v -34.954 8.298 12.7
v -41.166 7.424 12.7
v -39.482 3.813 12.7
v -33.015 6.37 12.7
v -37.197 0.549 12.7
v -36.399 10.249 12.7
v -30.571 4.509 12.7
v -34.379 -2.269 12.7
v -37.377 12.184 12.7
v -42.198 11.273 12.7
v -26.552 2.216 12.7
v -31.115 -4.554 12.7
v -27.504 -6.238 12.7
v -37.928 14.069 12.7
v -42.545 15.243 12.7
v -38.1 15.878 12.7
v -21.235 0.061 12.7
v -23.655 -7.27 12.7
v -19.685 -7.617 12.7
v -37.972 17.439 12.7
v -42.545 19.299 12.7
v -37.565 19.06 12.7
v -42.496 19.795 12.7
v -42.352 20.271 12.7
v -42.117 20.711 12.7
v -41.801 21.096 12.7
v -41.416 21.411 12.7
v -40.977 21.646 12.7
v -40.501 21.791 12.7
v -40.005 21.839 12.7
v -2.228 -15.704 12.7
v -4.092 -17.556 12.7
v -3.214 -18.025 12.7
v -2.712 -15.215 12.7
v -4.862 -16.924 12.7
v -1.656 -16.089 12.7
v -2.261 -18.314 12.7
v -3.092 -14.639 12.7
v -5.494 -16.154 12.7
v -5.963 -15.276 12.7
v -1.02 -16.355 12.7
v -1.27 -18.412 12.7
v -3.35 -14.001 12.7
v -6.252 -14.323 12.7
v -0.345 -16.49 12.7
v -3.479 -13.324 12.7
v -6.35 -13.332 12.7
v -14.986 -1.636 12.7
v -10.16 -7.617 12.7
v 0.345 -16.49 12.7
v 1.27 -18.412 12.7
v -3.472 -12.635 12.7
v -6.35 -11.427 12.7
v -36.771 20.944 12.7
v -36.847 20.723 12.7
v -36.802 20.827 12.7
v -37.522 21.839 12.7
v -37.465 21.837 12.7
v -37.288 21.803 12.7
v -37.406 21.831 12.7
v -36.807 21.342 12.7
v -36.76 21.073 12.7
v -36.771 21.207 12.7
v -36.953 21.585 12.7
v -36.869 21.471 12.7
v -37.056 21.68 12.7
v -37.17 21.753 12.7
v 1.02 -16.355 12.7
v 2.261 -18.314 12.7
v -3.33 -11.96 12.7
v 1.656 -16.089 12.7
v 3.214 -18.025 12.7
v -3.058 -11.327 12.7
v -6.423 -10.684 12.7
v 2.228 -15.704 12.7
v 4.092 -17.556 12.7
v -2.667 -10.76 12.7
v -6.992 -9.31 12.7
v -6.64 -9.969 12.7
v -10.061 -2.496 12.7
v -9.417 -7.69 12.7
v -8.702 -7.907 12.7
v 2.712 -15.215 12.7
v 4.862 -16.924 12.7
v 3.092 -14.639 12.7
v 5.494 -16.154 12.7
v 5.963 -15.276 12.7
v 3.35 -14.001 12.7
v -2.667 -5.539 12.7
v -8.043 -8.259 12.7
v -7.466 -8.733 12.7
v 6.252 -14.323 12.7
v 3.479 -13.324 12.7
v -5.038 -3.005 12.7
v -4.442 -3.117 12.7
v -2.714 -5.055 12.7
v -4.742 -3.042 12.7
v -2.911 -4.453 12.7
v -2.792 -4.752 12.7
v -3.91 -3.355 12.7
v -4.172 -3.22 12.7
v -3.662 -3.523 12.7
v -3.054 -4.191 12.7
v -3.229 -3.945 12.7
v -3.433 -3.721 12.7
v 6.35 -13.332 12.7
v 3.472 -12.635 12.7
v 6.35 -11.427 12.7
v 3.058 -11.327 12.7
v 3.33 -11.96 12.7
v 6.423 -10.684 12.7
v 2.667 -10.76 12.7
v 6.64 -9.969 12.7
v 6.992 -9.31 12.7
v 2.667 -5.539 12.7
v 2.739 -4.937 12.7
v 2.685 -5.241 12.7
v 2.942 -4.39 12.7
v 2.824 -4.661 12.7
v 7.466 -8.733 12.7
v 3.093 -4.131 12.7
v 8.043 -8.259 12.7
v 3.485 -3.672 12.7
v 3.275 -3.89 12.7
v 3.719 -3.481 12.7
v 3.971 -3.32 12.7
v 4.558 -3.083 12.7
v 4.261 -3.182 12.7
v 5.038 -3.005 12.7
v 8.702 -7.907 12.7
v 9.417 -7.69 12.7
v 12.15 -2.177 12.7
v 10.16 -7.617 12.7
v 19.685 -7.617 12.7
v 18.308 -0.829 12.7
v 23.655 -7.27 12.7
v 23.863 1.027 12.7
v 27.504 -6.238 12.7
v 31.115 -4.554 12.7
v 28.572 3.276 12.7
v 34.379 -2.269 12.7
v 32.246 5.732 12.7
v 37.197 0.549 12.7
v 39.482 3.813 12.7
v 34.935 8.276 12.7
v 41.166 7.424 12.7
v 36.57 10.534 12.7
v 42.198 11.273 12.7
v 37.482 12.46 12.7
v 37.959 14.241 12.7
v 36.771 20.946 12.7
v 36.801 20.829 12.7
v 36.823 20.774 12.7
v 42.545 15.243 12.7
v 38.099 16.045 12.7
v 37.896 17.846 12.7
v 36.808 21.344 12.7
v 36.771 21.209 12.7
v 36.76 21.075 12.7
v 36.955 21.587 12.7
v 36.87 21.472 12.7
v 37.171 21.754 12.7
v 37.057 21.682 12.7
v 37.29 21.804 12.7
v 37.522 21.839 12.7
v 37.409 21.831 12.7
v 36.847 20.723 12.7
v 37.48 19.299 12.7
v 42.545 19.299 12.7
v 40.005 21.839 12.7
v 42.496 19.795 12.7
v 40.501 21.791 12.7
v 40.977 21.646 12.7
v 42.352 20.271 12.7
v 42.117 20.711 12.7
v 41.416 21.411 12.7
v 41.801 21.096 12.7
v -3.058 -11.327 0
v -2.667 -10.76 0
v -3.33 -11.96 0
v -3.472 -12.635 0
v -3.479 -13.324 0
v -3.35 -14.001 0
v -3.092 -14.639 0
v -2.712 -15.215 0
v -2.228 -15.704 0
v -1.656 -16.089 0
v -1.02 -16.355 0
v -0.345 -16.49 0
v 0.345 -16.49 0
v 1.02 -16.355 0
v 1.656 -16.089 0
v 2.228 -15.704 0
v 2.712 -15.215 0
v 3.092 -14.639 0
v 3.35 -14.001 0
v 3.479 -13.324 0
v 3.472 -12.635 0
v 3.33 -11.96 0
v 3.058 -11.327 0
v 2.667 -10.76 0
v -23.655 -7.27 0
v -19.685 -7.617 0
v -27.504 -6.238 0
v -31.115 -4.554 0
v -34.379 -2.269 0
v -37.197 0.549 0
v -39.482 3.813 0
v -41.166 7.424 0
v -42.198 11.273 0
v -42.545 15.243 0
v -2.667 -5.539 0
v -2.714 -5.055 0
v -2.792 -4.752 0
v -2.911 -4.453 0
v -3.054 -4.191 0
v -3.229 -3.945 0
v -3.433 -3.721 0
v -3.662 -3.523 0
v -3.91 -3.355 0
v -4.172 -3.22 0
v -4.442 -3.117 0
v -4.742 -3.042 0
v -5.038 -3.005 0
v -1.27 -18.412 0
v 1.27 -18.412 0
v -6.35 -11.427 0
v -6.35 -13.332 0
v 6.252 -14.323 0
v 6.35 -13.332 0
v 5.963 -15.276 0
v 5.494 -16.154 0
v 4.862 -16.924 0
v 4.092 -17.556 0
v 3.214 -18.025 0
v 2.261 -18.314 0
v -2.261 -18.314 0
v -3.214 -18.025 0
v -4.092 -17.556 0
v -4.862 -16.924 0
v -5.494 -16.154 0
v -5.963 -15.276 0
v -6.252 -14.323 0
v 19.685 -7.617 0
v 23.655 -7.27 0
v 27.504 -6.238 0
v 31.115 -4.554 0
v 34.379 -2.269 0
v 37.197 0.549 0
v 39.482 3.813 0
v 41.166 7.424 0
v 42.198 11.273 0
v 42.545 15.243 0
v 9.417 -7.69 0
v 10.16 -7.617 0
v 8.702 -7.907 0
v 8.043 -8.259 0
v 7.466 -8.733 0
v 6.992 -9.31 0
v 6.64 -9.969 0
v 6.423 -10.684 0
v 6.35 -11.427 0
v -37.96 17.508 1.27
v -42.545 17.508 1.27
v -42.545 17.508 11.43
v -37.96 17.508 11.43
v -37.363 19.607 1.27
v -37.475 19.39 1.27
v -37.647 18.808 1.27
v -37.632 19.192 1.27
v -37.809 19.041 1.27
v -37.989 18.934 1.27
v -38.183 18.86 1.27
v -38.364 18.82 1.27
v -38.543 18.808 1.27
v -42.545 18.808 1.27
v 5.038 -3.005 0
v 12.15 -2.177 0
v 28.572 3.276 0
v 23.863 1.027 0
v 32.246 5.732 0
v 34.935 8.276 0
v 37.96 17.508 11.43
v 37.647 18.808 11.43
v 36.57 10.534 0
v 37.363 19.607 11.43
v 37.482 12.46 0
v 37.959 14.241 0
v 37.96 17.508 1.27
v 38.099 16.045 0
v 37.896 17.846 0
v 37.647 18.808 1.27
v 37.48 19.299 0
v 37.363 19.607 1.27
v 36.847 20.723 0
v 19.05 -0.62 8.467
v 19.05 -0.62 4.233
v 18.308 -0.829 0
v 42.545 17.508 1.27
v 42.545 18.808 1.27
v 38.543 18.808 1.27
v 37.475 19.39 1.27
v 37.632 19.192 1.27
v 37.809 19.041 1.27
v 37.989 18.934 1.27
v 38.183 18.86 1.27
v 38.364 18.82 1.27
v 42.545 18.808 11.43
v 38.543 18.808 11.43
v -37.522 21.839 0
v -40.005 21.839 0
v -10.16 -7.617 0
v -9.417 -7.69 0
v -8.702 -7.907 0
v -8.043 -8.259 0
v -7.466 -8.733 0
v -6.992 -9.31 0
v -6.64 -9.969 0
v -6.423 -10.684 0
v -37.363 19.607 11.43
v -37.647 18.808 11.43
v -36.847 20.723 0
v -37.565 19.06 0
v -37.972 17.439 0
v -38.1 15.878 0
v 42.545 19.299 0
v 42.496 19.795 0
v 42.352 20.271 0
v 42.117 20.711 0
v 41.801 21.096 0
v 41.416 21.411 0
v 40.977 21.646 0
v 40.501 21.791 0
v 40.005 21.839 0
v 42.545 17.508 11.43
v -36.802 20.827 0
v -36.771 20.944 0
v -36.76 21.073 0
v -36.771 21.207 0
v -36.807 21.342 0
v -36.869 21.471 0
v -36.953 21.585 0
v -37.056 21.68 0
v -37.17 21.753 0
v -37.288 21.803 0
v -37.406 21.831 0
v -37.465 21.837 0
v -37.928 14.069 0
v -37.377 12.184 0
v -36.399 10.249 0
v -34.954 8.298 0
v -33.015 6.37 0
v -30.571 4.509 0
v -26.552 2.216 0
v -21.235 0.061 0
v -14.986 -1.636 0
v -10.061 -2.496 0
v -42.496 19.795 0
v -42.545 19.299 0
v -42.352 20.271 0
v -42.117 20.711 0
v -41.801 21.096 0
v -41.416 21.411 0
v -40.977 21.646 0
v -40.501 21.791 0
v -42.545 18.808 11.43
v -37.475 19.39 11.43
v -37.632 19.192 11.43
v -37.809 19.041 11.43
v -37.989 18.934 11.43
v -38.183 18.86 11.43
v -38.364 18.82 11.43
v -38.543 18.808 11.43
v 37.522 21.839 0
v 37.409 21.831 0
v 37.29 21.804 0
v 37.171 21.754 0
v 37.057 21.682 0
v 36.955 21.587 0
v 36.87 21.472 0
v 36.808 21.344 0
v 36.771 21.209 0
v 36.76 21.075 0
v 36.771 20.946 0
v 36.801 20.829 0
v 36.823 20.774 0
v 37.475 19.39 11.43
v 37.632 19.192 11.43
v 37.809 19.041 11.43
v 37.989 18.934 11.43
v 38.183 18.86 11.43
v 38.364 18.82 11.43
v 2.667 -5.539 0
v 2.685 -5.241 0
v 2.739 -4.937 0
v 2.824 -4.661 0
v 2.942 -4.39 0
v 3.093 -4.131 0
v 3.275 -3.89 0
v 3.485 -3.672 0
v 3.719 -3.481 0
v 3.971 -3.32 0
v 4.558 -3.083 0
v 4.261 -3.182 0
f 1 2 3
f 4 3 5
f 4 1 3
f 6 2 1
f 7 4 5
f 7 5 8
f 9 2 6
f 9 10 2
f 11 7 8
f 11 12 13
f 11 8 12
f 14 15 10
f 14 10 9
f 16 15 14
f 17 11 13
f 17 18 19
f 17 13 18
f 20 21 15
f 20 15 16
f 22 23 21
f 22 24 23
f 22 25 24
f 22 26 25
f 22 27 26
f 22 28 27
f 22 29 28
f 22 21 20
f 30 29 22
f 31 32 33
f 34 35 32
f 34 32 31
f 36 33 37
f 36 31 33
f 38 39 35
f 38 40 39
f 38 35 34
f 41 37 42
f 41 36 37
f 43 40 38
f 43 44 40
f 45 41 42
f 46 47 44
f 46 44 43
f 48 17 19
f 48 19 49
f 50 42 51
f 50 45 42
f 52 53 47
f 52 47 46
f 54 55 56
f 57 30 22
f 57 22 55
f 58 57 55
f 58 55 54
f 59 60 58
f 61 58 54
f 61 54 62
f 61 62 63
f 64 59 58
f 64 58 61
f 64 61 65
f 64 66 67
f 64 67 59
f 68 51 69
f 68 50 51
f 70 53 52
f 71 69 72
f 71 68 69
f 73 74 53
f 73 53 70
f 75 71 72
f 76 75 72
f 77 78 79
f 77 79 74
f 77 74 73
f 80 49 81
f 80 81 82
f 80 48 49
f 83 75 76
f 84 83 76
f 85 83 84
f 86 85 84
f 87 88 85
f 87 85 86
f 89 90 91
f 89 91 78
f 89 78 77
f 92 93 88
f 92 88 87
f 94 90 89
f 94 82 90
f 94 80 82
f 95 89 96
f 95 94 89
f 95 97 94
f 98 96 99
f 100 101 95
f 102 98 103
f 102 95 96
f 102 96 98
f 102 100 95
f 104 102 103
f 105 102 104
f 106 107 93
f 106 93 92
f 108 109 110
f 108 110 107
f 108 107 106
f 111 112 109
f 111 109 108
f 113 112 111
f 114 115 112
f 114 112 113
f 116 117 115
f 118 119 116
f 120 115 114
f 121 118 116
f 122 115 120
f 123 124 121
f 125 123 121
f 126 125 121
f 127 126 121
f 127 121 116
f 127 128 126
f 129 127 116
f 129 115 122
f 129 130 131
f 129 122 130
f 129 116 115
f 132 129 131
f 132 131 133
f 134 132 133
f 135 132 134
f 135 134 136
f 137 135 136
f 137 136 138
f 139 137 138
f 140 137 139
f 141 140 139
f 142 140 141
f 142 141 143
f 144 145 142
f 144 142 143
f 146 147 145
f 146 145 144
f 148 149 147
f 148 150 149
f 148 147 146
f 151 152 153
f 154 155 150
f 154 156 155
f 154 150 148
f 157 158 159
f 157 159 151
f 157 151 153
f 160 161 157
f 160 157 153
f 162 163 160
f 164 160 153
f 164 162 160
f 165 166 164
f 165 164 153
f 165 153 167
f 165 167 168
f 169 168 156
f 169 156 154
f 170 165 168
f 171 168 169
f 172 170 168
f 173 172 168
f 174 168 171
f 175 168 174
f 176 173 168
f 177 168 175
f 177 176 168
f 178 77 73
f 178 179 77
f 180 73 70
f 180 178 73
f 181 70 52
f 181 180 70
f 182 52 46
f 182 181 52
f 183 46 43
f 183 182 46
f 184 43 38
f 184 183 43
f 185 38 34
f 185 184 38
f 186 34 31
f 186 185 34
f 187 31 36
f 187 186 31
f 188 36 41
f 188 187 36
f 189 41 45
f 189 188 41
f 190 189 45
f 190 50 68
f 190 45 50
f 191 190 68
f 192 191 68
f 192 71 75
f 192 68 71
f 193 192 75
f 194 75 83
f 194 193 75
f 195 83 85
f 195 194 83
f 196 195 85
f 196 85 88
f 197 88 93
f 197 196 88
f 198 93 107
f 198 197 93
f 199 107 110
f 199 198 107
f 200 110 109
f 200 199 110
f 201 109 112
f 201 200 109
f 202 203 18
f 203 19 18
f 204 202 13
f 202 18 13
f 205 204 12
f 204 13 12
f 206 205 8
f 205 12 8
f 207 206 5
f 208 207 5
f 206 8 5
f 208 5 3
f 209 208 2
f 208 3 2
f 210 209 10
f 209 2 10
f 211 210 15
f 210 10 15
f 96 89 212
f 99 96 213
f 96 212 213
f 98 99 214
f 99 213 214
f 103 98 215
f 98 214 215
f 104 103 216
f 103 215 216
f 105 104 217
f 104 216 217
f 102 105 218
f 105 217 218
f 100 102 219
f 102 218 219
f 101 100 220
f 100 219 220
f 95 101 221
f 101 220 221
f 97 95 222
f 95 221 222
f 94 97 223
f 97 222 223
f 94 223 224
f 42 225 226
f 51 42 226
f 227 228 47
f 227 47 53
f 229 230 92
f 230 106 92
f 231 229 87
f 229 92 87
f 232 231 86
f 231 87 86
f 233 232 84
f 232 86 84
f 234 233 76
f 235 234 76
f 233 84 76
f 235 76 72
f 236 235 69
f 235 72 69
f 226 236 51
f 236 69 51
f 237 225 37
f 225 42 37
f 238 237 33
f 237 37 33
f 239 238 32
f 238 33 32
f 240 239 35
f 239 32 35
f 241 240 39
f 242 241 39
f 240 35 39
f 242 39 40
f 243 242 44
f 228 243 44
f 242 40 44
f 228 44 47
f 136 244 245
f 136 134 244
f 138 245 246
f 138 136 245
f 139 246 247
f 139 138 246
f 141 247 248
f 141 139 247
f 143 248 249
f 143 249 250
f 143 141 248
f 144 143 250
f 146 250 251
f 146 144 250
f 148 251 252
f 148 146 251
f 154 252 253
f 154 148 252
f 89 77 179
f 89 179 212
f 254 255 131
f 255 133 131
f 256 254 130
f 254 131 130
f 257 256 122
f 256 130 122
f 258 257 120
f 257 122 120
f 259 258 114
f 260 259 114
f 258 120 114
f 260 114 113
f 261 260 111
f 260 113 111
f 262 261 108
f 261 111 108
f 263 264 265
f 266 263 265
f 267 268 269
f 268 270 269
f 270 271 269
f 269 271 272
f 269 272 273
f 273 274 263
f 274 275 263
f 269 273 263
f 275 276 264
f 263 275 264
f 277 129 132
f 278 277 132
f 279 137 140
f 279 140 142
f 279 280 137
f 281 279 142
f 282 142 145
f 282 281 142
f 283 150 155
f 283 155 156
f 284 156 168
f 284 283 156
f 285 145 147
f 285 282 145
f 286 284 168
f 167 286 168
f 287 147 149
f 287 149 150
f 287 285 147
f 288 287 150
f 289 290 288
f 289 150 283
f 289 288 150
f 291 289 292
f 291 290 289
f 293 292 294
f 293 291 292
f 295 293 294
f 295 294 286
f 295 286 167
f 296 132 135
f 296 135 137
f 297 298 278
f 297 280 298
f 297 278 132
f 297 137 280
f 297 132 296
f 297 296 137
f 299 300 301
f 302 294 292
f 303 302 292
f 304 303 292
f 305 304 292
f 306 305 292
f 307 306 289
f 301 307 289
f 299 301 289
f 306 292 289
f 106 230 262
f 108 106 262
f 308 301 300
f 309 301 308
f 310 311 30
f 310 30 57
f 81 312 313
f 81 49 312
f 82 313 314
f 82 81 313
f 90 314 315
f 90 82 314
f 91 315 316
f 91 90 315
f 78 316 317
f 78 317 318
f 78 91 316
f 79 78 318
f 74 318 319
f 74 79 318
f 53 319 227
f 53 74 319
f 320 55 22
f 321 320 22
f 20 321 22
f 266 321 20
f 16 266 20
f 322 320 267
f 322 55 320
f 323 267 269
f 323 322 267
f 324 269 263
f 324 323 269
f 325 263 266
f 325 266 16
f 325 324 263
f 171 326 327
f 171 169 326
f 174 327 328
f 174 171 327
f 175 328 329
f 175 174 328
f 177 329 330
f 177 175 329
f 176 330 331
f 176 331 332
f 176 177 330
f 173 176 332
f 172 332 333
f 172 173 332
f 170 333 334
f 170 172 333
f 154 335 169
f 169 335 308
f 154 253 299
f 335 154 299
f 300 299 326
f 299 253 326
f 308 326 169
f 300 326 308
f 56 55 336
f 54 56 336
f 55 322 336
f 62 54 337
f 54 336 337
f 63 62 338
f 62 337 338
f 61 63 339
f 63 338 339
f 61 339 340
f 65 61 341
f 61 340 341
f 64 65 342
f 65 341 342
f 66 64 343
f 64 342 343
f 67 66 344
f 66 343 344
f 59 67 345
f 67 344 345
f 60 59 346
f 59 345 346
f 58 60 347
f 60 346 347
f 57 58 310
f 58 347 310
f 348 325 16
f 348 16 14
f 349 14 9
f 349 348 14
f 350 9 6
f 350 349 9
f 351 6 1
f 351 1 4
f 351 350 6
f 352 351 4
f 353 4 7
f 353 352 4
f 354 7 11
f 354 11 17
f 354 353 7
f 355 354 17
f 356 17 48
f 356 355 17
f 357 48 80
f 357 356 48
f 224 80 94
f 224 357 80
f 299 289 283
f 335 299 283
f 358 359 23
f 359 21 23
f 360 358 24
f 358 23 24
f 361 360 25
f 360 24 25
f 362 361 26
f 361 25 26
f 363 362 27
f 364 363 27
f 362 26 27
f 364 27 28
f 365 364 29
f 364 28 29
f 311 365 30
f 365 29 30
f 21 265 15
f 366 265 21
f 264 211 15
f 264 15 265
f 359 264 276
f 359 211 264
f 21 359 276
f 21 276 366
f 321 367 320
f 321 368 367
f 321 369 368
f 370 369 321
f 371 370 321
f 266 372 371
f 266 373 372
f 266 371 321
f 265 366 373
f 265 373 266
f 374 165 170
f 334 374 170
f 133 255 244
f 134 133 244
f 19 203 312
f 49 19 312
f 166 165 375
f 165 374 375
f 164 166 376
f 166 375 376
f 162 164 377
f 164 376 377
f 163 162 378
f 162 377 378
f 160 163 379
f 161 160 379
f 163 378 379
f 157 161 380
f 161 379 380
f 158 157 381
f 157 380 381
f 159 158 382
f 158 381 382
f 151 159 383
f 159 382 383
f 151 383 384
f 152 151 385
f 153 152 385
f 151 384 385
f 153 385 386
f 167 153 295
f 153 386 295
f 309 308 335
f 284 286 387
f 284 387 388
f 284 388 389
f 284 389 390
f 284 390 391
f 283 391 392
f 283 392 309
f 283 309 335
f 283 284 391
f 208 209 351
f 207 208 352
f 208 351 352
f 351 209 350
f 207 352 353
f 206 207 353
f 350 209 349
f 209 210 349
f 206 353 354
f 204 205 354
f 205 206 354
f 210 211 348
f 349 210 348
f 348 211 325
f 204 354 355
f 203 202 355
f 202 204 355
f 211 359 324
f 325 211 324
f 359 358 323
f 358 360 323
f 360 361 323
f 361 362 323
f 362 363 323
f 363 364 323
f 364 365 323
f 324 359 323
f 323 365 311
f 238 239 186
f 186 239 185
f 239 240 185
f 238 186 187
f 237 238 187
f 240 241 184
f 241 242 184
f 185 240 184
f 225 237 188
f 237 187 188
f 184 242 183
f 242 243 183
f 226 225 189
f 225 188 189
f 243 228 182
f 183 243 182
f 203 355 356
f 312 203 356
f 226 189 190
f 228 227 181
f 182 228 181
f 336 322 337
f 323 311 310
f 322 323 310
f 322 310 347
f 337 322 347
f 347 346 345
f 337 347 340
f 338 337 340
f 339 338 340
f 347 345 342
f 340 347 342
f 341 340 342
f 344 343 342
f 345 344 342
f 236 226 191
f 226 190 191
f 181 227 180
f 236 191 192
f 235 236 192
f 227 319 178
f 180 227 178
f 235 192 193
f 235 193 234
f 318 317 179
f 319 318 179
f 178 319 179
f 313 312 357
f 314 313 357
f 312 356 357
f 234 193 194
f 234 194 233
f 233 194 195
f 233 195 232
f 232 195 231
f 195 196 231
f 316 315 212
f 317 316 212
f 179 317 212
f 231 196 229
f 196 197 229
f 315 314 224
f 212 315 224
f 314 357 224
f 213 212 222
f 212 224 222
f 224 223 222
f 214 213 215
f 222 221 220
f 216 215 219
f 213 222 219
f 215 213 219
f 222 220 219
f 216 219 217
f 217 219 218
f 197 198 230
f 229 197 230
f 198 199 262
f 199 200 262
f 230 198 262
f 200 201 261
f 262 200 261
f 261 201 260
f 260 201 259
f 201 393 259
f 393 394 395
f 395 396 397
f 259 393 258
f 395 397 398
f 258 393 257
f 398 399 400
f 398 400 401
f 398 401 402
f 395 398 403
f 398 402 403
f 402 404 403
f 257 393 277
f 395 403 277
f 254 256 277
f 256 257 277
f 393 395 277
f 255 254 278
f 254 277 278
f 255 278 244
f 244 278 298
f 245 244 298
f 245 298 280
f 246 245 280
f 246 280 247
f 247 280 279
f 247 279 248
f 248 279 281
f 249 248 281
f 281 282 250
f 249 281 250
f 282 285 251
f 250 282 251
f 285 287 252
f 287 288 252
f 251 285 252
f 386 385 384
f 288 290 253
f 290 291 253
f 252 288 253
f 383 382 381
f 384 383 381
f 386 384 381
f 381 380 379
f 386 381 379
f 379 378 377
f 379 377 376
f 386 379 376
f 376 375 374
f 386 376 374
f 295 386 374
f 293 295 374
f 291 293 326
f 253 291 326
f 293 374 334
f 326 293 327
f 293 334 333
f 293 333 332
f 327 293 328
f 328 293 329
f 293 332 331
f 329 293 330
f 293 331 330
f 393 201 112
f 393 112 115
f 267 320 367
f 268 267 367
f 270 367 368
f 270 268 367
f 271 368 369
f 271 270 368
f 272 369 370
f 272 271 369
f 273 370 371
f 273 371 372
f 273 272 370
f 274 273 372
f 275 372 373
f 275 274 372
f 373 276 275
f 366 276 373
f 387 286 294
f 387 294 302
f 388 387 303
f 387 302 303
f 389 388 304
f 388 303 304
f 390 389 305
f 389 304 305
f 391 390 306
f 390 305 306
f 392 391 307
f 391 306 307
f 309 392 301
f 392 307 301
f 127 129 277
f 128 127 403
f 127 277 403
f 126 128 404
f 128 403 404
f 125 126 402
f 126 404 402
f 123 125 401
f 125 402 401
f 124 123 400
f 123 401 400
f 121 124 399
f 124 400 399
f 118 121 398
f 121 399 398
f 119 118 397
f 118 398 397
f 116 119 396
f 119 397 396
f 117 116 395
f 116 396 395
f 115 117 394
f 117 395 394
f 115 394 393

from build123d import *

# Parameters (mm, degrees)
F2_W      = 12.7
F2_H      = 10.795
F5_DEPTH  = 12.7
F0_W      = 85.09
F0_H      = 46.99
F7_DEPTH  = 12.7
F3_R      = 3.4925
F4_W      = 5.334
F4_H      = 12.7
F8_DEPTH  = 12.7
F10_DEPTH = 12.7
F12_R     = 3.81
F13_R     = 22.86
F14_R     = 5.08
F15_R     = 2.54
F16_R     = 0.762
F17_W     = 1.3
F17_H     = 10.16
F18_DEPTH = 88.9
F19_R     = 1.27


# Not quite as in the source:
# - a feature of the source that left no trace in its solid (it failed there, or was rolled back) is left out


with BuildPart() as f5:
    # F2 (on Top) → F5 (new body)
    with BuildSketch(Plane.XY):
        with Locations((0, -13.0144613445)):
            Rectangle(F2_W, F2_H)
    extrude(amount=F5_DEPTH)


with BuildPart() as f5b:
    # F0 (on Top) → F5, piece 2 (new body)
    with BuildSketch(Plane.XY):
        with Locations((0, 15.8780386555)):
            Rectangle(F0_W, F0_H)
    extrude(amount=F5_DEPTH)

    # F6: union F5
    add(f5.part)

    # F1 (on face) → F7 (cut)
    with BuildSketch(Plane.XY):
        with BuildLine():
            add(Edge.make_bspline(
                [(-38.1, 15.8780386555), (-38.1, -17.1175292287), (19.05, -0.6197452866), (76.2, 15.8780386555), (19.05, 32.3758225976), (-38.1, 48.8736065397), (-38.1, 15.8780386555)],
                knots=[0, 0, 0, 2.0943951024, 2.0943951024, 4.1887902048, 4.1887902048, 6.2831853072, 6.2831853072, 6.2831853072], degree=2, weights=[1, 0.5, 1, 0.5, 1, 0.5, 1]))
        make_face()
    extrude(amount=F7_DEPTH, mode=Mode.SUBTRACT)

    # F3 (on Top) + F4 (on Top) → F8 (cut)
    with BuildSketch(Plane.XY):
        with Locations((0, -13.0144613445)):
            Circle(F3_R)
    with BuildSketch(Plane.XY):
        with Locations((0, -6.6644613445)):
            Rectangle(F4_W, F4_H)
    extrude(amount=F8_DEPTH, mode=Mode.SUBTRACT)

    # F9 (on face) → F10 (cut)
    with BuildSketch(Plane.XY.offset(12.7)):
        Polygon((48.7572182757, 21.839483929), (48.7572182757, 42.4993435767), (-49.0327817243, 42.4993435767), (-49.0327817243, 21.839483929), (-42.545, 21.839483929), (-42.545, 39.3730386555), (42.545, 39.3730386555), (42.545, 21.839483929), align=None)
        with BuildLine():
            Line((36.1863880624, 21.839483929), (42.545, 21.839483929))
            Line((42.545, 21.839483929), (42.545, 39.3730386555))
            Line((42.545, 39.3730386555), (-42.545, 39.3730386555))
            Line((-42.545, 39.3730386555), (-42.545, 21.839483929))
            Line((-42.545, 21.839483929), (-36.1863880624, 21.839483929))
            add(Edge.make_bspline(
                [(36.1863880624, 21.839483929), (31.637806335, 28.7420359095), (19.05, 32.3758225976), (-21.5247671589, 44.0887489683), (-36.1863880624, 21.839483929)],
                knots=[3.4327056268, 3.4327056268, 3.4327056268, 4.1887902048, 4.1887902048, 5.9279520588, 5.9279520588, 5.9279520588], degree=2, weights=[0.7693199453, 0.819498103, 1, 0.5848056911, 0.8591566387]))
        make_face()
    extrude(amount=-F10_DEPTH, mode=Mode.SUBTRACT)

    # F12
    f12_edges = [f5b.edges().sort_by_distance(p)[0] for p in [
        (-6.35, -7.616961, 6.35),
        (6.35, -7.616961, 6.35),
    ]]
    fillet(f12_edges, radius=F12_R)

    # F13
    f13_edges = [f5b.edges().sort_by_distance(p)[0] for p in [
        (-42.545, -7.616961, 6.35),
        (42.545, -7.616961, 6.35),
    ]]
    fillet(f13_edges, radius=F13_R)

    # F14
    f14_edges = [f5b.edges().sort_by_distance(p)[0] for p in [
        (-6.35, -18.411961, 6.35),
        (6.35, -18.411961, 6.35),
    ]]
    fillet(f14_edges, radius=F14_R)

    # F15
    f15_edges = [f5b.edges().sort_by_distance(p)[0] for p in [
        (-42.545, 21.839484, 6.35),
        (42.545, 21.839484, 6.35),
        (2.667, -3.125232, 6.35),
        (-2.667, -3.125232, 6.35),
    ]]
    fillet(f15_edges, radius=F15_R)

    # F16
    f16_edges = [f5b.edges().sort_by_distance(p)[0] for p in [
        (-36.186388, 21.839484, 6.35),
        (36.186388, 21.839484, 6.35),
    ]]
    fillet(f16_edges, radius=F16_R)

    # F17 (on face) → F18 (cut)
    with BuildSketch(Plane(origin=(-42.545, 0, 0), x_dir=(0, -1, 0), z_dir=(-1, 0, 0))):
        with Locations((-18.1576684117, 6.35)):
            Rectangle(F17_W, F17_H)
    extrude(amount=-F18_DEPTH, mode=Mode.SUBTRACT)

    # F19
    f19_edges = [f5b.edges().sort_by_distance(p)[0] for p in [
        (37.646767, 18.807668, 6.35),
        (-37.646767, 18.807668, 6.35),
    ]]
    fillet(f19_edges, radius=F19_R)


solid = f5b.part
